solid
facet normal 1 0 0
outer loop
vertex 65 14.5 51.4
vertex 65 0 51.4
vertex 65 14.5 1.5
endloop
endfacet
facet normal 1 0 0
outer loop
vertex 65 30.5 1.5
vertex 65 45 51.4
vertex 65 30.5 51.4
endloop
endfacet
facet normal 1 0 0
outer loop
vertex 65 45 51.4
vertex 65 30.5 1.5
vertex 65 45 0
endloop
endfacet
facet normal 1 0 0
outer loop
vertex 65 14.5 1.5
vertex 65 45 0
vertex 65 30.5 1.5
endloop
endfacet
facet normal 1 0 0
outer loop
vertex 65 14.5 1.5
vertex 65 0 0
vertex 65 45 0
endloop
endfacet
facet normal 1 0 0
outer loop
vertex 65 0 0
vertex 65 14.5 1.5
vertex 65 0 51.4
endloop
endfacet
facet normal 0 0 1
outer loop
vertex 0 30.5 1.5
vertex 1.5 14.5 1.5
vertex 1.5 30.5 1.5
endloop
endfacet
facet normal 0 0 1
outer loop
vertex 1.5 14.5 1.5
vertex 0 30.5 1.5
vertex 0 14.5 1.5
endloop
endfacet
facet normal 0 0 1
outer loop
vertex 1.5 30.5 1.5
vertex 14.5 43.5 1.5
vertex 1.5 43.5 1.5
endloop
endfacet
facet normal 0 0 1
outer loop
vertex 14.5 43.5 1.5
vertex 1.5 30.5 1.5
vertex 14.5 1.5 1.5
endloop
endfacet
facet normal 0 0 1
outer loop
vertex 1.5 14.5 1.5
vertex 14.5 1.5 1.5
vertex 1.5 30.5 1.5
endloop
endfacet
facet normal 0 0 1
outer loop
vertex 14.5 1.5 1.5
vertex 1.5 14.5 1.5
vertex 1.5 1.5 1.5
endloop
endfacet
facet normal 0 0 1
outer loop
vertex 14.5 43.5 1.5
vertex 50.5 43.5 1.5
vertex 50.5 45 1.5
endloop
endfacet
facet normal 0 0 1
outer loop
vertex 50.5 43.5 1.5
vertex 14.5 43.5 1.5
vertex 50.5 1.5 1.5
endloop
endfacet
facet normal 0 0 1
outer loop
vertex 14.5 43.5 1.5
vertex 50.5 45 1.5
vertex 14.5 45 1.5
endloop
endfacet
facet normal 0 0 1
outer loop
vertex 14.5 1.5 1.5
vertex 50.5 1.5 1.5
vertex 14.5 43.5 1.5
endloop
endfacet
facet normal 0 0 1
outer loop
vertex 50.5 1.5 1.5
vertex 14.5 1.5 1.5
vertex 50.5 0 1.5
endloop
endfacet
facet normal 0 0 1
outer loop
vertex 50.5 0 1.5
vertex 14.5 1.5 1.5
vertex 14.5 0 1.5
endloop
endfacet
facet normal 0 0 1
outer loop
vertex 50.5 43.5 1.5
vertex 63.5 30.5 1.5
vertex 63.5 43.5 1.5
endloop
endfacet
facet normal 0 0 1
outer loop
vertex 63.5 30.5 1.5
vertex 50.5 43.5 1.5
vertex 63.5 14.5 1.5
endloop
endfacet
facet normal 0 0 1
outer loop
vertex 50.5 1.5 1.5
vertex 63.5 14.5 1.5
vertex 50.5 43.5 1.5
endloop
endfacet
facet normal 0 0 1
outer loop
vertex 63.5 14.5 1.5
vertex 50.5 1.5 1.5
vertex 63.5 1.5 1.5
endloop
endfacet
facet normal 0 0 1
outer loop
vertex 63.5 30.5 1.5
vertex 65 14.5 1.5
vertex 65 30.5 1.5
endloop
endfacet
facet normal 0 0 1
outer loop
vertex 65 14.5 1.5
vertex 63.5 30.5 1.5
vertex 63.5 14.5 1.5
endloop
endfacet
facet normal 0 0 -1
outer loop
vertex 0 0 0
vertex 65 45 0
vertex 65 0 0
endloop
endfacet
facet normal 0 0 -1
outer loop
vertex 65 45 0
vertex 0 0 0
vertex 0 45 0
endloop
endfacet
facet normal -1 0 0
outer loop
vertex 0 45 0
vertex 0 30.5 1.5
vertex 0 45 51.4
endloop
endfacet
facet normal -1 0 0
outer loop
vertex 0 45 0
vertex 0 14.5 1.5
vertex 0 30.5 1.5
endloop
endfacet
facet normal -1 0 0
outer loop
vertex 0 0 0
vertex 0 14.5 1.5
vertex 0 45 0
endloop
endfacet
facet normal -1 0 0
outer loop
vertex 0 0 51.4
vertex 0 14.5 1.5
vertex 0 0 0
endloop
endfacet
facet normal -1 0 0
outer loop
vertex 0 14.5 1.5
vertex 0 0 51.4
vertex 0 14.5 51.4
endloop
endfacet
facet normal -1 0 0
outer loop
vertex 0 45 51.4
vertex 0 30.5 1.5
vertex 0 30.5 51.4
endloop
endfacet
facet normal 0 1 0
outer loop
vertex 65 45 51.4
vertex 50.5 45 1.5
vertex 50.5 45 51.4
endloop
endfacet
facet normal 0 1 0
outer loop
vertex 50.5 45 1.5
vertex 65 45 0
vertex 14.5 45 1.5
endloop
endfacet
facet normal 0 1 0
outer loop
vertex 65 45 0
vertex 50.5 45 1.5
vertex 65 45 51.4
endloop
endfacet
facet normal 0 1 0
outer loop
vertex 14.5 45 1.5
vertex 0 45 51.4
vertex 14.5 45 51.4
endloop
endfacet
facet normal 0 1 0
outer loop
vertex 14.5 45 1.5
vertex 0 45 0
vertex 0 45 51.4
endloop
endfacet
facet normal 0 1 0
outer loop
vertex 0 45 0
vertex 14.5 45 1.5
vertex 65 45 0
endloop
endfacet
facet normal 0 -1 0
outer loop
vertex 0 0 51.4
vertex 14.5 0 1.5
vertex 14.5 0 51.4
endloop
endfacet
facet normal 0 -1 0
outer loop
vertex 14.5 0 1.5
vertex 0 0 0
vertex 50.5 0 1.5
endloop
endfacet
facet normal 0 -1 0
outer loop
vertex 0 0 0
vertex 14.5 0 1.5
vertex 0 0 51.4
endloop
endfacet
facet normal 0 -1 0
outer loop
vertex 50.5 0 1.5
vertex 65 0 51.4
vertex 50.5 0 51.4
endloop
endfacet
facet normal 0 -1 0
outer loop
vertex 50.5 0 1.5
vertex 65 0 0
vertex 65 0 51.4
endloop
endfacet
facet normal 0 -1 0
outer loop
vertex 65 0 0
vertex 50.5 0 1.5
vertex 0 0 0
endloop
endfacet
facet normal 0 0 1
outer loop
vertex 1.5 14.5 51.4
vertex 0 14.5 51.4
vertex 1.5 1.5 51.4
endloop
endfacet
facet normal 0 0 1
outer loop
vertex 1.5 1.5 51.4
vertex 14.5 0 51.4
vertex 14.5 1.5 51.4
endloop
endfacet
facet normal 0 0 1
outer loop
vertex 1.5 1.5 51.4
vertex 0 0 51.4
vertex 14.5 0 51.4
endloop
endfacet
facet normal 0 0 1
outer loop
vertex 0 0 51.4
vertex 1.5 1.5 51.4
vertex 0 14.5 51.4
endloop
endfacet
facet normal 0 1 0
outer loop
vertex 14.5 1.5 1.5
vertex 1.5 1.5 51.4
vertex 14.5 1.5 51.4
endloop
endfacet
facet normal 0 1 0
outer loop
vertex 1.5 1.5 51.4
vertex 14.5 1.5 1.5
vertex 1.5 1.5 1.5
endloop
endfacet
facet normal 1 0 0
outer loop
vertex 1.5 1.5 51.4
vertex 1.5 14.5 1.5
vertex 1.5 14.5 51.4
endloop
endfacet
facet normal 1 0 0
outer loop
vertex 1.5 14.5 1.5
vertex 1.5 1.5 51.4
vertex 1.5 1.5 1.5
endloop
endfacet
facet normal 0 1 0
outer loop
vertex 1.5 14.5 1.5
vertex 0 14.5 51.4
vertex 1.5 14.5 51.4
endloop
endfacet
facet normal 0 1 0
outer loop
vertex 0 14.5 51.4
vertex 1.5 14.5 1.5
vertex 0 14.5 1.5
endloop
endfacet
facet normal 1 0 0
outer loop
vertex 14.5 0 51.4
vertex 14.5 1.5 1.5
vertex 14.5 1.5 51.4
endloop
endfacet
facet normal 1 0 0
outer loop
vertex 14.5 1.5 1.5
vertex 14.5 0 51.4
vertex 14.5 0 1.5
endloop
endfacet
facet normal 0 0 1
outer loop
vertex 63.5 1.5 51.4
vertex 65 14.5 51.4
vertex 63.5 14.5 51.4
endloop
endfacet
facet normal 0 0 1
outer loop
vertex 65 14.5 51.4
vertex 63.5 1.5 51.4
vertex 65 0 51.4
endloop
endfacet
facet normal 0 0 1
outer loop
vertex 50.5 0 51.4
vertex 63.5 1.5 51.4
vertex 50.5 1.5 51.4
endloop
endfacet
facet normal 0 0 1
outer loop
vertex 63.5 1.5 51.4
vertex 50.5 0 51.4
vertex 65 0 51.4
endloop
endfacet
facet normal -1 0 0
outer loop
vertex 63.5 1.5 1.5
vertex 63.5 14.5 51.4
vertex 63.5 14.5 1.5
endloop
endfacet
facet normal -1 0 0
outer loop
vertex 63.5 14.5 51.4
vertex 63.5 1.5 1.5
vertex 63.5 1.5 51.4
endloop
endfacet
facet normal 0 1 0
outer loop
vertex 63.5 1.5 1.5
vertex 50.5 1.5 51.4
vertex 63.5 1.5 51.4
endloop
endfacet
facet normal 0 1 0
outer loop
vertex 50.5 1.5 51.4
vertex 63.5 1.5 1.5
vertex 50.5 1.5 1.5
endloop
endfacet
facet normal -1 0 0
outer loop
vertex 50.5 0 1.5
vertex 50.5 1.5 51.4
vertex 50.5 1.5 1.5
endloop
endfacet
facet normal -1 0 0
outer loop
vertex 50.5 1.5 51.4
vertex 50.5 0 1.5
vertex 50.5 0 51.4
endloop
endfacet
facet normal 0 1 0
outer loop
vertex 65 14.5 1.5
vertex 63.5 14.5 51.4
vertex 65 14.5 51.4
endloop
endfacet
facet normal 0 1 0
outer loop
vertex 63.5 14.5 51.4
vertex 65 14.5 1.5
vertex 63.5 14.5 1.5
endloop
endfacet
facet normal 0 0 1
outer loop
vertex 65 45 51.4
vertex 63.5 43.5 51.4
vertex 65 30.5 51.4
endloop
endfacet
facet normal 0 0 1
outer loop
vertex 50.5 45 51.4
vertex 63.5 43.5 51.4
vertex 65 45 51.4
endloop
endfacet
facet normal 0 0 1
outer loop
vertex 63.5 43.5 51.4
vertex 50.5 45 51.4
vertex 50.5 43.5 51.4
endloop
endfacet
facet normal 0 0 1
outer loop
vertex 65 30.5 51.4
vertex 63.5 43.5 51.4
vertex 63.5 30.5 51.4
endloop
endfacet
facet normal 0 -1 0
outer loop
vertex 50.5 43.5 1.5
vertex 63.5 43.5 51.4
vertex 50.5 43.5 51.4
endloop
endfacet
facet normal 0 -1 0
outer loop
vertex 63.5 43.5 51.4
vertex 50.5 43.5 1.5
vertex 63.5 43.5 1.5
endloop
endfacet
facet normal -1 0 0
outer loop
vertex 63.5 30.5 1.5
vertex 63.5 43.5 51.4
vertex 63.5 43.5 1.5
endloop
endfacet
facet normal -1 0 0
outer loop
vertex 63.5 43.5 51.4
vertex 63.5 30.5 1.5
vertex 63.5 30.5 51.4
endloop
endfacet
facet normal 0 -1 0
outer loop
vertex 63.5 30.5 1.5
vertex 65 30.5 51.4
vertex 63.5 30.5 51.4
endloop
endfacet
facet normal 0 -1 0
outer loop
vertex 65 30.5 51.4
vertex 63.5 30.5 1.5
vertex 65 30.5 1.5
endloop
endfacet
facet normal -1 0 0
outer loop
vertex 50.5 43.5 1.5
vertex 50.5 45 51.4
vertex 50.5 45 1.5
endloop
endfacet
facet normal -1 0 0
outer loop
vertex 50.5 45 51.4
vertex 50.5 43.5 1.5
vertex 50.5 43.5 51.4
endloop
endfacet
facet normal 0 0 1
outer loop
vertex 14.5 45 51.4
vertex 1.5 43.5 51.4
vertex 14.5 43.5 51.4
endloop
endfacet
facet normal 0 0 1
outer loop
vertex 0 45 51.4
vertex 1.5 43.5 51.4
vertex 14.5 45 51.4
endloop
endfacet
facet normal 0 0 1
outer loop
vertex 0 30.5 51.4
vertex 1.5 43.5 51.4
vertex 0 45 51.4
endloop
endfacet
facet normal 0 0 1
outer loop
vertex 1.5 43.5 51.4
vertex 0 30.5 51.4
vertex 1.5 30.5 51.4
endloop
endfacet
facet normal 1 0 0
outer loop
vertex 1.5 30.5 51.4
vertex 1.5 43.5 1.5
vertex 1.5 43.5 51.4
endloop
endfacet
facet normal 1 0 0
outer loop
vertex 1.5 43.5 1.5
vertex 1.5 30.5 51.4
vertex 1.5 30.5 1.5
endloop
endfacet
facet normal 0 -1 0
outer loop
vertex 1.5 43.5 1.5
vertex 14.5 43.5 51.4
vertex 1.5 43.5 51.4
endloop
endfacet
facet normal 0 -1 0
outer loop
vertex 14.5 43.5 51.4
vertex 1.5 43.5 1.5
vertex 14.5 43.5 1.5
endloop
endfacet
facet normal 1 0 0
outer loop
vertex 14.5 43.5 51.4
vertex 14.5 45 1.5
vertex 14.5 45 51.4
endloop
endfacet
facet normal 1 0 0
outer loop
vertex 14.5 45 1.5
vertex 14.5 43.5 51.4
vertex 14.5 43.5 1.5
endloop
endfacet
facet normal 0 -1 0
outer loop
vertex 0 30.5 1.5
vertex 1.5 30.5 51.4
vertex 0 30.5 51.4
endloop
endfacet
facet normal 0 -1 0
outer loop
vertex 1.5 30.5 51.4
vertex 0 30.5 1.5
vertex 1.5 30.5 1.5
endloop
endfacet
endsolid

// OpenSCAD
show_box = 1;
//else show lid

card_x = 61 + 1;
card_y = 41 + 1;
card_z = 2.2;

card_sum = 22;

box_wall = 1.5;
box_hold = box_wall * 2;
box_grip = 13;

lid_grip = 10;

module grip()
{
  linear_extrude(height = (card_z * card_sum) + box_hold)
  {
    polygon(points=[[0, 0],
                    [box_grip + box_wall, 0],
                    [box_grip + box_wall, box_wall],
                    [box_wall, box_wall],
                    [box_wall, box_wall + box_grip],
                    [0, box_wall + box_grip]]);       
  }
}

if(show_box)
{
  union()
  {
    cube([card_x + (2 * box_wall), card_y + (2 * box_wall), box_wall]);
    grip();
    translate([card_x + (2 * box_wall), 0, 0])
    {
      rotate([0, 0, 90])
      {
        grip();
      }
    }
    translate([card_x + (2 * box_wall), card_y + (2 * box_wall), 0])
    {
      rotate([0, 0, 180])
      {
        grip();
      }
    }
    translate([0, card_y + (2 * box_wall), 0])
    {
      rotate([0, 0, -90])
      {
        grip();
      }
    }
  }
}
else
{
  union()
  {
    cube([card_x + (2 * box_wall), card_y + (2 * box_wall), box_wall]);
    translate([box_wall, box_wall, box_wall])
    {
      cube([card_x, card_y, box_hold]);
    }
    
    translate([0, box_wall + box_grip, box_wall])
    {
      cube([box_wall, card_y - (2 * box_grip), lid_grip]);
    }
    translate([box_wall + card_x, box_wall + box_grip, box_wall])
    {
      cube([box_wall, card_y - (2 * box_grip), lid_grip]);
    }
    translate([box_wall + box_grip, 0, box_wall])
    {
      cube([card_x - (2 * box_grip), box_wall, lid_grip]);
    }
    translate([box_wall + box_grip, box_wall + card_y, box_wall])
    {
      cube([card_x - (2 * box_grip), box_wall, lid_grip]);
    }
  }
}
